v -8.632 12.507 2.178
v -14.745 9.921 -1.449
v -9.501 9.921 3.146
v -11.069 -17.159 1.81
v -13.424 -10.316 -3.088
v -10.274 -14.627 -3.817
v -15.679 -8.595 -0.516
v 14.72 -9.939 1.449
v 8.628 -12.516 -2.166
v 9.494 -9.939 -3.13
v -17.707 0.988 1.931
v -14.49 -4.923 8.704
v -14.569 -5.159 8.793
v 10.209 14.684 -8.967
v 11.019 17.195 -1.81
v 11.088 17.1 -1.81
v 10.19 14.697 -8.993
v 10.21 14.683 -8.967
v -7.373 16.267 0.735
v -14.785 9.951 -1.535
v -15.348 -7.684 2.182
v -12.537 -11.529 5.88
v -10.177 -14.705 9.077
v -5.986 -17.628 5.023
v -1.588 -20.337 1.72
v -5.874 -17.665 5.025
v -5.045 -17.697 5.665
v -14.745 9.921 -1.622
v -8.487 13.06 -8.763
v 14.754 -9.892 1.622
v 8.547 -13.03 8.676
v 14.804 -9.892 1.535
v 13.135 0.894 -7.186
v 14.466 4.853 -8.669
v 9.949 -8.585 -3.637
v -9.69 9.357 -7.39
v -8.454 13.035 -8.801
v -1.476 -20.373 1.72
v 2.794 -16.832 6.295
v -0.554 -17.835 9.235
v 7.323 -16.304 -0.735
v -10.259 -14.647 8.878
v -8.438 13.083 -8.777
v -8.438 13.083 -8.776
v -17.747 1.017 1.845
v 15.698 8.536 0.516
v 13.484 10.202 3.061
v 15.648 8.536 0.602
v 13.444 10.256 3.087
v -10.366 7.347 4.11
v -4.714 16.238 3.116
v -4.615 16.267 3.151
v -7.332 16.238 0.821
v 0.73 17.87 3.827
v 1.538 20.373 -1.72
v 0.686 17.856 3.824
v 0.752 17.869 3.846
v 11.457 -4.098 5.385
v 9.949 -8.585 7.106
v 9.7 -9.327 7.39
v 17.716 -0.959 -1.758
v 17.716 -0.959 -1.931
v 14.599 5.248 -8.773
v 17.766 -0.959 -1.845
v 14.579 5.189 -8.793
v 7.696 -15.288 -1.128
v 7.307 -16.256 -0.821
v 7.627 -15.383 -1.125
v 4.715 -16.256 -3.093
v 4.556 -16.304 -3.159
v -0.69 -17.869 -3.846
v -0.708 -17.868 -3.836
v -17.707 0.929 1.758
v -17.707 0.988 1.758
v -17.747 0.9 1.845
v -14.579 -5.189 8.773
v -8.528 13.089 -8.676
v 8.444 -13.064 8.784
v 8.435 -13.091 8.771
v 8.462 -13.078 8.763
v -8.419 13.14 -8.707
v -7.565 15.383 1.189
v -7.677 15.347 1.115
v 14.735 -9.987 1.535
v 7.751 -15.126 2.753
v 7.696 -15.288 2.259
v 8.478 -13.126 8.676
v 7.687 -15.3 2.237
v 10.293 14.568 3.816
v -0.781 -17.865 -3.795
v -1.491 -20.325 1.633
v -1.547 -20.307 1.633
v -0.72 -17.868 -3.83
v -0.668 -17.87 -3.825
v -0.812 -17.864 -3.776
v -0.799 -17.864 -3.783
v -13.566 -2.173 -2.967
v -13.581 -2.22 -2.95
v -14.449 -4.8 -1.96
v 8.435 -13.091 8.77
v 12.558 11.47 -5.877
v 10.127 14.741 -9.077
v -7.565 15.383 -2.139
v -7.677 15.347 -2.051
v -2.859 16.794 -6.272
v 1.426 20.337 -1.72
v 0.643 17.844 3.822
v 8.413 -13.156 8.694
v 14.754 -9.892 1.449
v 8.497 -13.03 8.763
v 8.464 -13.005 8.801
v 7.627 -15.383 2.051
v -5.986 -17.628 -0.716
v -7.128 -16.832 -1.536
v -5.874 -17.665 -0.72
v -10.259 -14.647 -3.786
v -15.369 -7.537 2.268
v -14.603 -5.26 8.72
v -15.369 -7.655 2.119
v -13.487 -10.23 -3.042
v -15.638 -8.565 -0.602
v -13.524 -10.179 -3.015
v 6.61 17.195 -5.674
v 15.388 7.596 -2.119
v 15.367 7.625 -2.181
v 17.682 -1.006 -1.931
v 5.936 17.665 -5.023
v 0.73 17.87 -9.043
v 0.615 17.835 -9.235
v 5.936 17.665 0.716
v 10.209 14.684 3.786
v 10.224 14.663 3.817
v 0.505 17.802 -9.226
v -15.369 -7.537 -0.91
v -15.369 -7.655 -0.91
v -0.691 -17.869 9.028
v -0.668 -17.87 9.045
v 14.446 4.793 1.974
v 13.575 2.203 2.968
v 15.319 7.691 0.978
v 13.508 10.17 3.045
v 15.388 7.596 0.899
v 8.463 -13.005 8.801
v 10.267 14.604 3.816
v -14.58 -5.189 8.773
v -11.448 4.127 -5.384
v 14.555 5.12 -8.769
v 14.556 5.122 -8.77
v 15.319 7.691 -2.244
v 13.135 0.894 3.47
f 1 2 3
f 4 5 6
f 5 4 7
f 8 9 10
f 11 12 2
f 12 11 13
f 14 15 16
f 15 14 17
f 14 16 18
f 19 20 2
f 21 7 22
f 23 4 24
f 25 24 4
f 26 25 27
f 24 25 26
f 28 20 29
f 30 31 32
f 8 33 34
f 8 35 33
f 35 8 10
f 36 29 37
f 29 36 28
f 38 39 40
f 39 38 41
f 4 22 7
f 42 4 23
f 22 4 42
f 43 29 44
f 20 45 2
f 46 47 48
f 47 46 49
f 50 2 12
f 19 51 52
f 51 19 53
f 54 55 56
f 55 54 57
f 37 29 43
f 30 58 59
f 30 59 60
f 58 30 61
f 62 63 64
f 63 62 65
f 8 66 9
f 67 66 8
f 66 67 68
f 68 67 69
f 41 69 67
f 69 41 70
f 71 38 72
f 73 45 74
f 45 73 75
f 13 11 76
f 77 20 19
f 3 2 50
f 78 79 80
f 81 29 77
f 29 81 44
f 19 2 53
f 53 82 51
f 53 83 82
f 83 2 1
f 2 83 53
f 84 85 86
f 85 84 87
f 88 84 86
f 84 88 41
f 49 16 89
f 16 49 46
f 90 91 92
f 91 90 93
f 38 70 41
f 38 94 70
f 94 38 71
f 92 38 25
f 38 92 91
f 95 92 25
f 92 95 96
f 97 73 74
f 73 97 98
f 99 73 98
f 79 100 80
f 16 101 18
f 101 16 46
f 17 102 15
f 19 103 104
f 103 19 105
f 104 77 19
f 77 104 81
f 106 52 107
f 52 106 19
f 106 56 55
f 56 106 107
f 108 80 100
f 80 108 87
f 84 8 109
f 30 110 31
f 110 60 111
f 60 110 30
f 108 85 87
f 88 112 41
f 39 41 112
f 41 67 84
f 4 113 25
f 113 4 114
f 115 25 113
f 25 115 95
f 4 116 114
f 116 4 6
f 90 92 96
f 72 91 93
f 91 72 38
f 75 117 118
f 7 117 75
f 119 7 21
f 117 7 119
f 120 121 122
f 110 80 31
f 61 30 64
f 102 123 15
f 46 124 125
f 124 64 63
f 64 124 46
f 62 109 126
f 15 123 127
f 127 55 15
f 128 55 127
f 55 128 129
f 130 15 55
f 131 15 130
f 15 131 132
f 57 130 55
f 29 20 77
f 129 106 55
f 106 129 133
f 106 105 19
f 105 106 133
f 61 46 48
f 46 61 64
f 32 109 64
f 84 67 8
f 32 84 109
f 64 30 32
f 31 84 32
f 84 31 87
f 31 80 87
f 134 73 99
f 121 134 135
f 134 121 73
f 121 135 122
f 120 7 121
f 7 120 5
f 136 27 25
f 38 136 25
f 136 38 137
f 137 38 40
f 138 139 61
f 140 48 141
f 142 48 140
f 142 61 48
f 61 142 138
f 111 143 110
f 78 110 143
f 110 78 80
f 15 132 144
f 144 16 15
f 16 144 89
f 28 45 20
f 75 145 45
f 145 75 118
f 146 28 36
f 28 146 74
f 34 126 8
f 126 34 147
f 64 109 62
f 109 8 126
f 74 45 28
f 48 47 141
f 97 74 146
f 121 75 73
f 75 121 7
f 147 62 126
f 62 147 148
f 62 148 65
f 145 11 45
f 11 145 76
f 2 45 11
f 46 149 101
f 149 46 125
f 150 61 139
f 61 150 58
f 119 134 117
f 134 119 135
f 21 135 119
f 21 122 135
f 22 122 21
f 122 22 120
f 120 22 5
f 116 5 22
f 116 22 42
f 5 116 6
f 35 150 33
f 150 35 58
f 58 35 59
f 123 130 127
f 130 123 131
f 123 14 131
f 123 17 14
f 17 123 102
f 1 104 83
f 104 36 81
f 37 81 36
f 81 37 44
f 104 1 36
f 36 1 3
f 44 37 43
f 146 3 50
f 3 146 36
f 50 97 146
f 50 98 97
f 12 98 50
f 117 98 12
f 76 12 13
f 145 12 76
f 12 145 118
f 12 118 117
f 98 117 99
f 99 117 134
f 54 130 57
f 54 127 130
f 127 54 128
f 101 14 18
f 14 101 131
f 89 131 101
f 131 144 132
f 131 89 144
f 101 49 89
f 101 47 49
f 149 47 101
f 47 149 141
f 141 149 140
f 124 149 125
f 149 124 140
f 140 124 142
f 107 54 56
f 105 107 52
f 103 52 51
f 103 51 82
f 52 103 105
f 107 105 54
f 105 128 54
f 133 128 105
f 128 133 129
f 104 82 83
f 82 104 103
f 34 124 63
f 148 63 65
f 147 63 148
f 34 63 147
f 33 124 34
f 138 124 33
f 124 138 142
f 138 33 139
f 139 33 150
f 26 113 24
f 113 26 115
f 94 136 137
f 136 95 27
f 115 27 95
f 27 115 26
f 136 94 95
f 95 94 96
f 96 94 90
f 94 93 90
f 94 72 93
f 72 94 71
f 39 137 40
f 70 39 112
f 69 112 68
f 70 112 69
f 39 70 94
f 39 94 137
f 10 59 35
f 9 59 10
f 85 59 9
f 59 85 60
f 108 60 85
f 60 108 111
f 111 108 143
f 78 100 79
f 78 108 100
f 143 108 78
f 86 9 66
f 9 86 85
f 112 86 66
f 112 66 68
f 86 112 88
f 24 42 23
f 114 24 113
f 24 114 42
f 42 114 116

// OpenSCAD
// Auto-generated OpenSCAD file

    inner_points = 10*[[-0.9849058201924669, 0.8585262410125142, 1.2071067811863656], [-1.528785757453395, -0.759623373893002, -0.49999999999996925], [-0.7596233738762859, 1.5287857574549684, 0.4999999999997299], [-1.3035033111372138, -0.08936385745054792, -1.207106781186605], [1.3035033111553536, 0.08936385743535108, 1.207106781186605], [0.7596233738944258, -1.528785757470165, -0.4999999999997299], [1.5287857574715347, 0.7596233738778053, 0.49999999999996925], [0.9849058202106068, -0.8585262410277109, -1.2071067811863656], [-1.3035033111373446, -0.08936385745018655, 1.2071067811864902], [-1.5287857574534491, -0.7596233738928524, 0.5000000000000306], [-0.7596233738762316, 1.5287857574548187, -0.50000000000027], [-0.9849058201923361, 0.8585262410121528, -1.2071067811867295], [0.984905820210476, -0.8585262410273495, 1.2071067811867295], [0.7596233738943715, -1.5287857574700154, 0.50000000000027], [1.5287857574715888, 0.7596233738776557, -0.5000000000000306], [1.3035033111554843, 0.0893638574349897, -1.2071067811864902], [-0.4739450492223731, 0.159298745465096, 1.707106781186498], [-1.0178249864833009, -1.4588508694404203, 1.6314155227994063e-13], [0.06993488803873991, 1.7774483603701012, -2.6229591075641936e-13], [-0.4739450492221878, 0.15929874546458486, -1.707106781186597], [0.4739450492403277, -0.1592987454797817, 1.707106781186597], [-0.06993488802060001, -1.777448360385298, 2.6229591075641936e-13], [1.0178249865014406, 1.4588508694252236, -1.6314155227994063e-13], [0.47394504924051306, -0.15929874548029285, -1.707106781186498], [-0.23902080233061446, 1.5083023029927278, 1.353553390593035], [-1.1014982305363656, -1.0577374103756392, -1.3535533905931754], [1.1014982305545054, 1.0577374103604424, 1.3535533905931754], [0.2390208023487544, -1.5083023030079246, -1.353553390593035], [0.27193996863947956, 0.8090748074453095, 1.8535533905931674], [-0.5905374595662716, -1.7569649059230572, -0.8535533905930429], [0.5905374595844115, 1.7569649059078605, 0.8535533905930429], [-0.2719399686213396, -0.8090748074605062, -1.8535533905931674]];

    outer_points = 10*[[-0.8446900511180744, 1.3030414766726957, -0.867637706641361], [-1.5597798480580507, -0.8536041736719377, -0.05157812186332089], [-0.25595636104042685, 0.8536041736719377, -1.5394998597940455], [-0.9710461579804031, -1.3030414766726957, -0.7234402750160054], [0.9710461579804031, 1.3030414766726957, 0.7234402750160054], [0.25595636104042685, -0.8536041736719377, 1.5394998597940455], [1.5597798480580507, 0.8536041736719377, 0.05157812186332089], [0.8446900511180744, -1.3030414766726957, 0.867637706641361], [-1.470432588051366, 0.9891747549732535, -0.15354110359529327], [-1.7666324802585267, 0.0958628773675625, 0.18448184412432744], [-0.04910372883995073, -0.0958628773675625, -1.7755598257816938], [-0.34530362104711143, -0.9891747549732535, -1.437536878062073], [0.34530362104711143, 0.9891747549732535, 1.437536878062073], [0.04910372883995073, 0.0958628773675625, 1.7755598257816938], [1.7666324802585267, -0.0958628773675625, -0.18448184412432744], [1.470432588051366, -0.9891747549732535, 0.15354110359529327], [-0.7291708128859692, 1.6208416413427247, 0.07345652930633434], [-1.4442606098259454, -0.5358040090019087, 0.8895161140843744], [0.692158046325446, 0.5358040090019087, -1.5485621928800661], [-0.022931750614530233, -1.6208416413427247, -0.732502608102026], [0.022931750614530233, 1.6208416413427247, 0.732502608102026], [-0.692158046325446, -0.5358040090019087, 1.5485621928800661], [1.4442606098259454, 0.5358040090019087, -0.8895161140843744], [0.7291708128859692, -1.6208416413427247, -0.07345652930633434], [0.03517302803740674, 1.7099897115417881, -1.113064062349067], [-1.098806673635385, -1.7099897115417881, 0.18103215948739226], [1.098806673635385, 1.7099897115417881, -0.18103215948739226], [-0.03517302803740674, -1.7099897115417881, 1.113064062349067], [0.15069226626951202, 2.027789876211817, -0.17196982640137165], [-0.9832874354032798, -1.392189546871759, 1.122126395435088], [0.9832874354032798, 1.392189546871759, -1.122126395435088], [-0.15069226626951202, -2.027789876211817, 0.17196982640137165]];

    // Convex hull for inner set (I)
    module inner_hull() {
        hull() {
            for (p = inner_points) {
                translate(p) sphere(r=0.1);
            }
        }
    }

    // Convex hull for outer set (O) minus inner hull (O \ I)
    module outer_minus_inner() {
        difference() {
            hull() {
                for (p = outer_points) {
                    translate(p) sphere(r=0.1);
                }
            }
            inner_hull(); // Subtract inner hull
        }
    }

    // Convex hull for outer set (O) minus all translated inner hulls
    module outer_minus_AllTranslationInner() {
        difference() {
            hull() {
                for (p = outer_points) {
                    translate(p) sphere(r=0.1);
                }
            }
            hull() {
                translate([0,0,50]) inner_hull();
                translate([0,0,-50]) inner_hull();
            }; // Subtract translated inner hulls
        }
    }

    // Difference between outer_minus_inner and outer_minus_AllTranslationInner
    module outer_minus_inner_diff() {
        difference() {
            // Outer minus inner
            difference() {
                hull() {
                    for (p = outer_points) {
                        translate(p) sphere(r=0.1);
                    }
                }
                inner_hull();
            }

            // Subtract Outer minus AllTranslationInner
            difference() {
                hull() {
                    for (p = outer_points) {
                        translate(p) sphere(r=0.1);
                    }
                }
                hull() {
                    translate([0,0,50]) inner_hull();
                    translate([0,0,-50]) inner_hull();
                };
            }
        }
    }

    // Rendering all with colors applied
    color([0, 1, 0, 1]) outer_minus_AllTranslationInner(); // Opaque green
    
